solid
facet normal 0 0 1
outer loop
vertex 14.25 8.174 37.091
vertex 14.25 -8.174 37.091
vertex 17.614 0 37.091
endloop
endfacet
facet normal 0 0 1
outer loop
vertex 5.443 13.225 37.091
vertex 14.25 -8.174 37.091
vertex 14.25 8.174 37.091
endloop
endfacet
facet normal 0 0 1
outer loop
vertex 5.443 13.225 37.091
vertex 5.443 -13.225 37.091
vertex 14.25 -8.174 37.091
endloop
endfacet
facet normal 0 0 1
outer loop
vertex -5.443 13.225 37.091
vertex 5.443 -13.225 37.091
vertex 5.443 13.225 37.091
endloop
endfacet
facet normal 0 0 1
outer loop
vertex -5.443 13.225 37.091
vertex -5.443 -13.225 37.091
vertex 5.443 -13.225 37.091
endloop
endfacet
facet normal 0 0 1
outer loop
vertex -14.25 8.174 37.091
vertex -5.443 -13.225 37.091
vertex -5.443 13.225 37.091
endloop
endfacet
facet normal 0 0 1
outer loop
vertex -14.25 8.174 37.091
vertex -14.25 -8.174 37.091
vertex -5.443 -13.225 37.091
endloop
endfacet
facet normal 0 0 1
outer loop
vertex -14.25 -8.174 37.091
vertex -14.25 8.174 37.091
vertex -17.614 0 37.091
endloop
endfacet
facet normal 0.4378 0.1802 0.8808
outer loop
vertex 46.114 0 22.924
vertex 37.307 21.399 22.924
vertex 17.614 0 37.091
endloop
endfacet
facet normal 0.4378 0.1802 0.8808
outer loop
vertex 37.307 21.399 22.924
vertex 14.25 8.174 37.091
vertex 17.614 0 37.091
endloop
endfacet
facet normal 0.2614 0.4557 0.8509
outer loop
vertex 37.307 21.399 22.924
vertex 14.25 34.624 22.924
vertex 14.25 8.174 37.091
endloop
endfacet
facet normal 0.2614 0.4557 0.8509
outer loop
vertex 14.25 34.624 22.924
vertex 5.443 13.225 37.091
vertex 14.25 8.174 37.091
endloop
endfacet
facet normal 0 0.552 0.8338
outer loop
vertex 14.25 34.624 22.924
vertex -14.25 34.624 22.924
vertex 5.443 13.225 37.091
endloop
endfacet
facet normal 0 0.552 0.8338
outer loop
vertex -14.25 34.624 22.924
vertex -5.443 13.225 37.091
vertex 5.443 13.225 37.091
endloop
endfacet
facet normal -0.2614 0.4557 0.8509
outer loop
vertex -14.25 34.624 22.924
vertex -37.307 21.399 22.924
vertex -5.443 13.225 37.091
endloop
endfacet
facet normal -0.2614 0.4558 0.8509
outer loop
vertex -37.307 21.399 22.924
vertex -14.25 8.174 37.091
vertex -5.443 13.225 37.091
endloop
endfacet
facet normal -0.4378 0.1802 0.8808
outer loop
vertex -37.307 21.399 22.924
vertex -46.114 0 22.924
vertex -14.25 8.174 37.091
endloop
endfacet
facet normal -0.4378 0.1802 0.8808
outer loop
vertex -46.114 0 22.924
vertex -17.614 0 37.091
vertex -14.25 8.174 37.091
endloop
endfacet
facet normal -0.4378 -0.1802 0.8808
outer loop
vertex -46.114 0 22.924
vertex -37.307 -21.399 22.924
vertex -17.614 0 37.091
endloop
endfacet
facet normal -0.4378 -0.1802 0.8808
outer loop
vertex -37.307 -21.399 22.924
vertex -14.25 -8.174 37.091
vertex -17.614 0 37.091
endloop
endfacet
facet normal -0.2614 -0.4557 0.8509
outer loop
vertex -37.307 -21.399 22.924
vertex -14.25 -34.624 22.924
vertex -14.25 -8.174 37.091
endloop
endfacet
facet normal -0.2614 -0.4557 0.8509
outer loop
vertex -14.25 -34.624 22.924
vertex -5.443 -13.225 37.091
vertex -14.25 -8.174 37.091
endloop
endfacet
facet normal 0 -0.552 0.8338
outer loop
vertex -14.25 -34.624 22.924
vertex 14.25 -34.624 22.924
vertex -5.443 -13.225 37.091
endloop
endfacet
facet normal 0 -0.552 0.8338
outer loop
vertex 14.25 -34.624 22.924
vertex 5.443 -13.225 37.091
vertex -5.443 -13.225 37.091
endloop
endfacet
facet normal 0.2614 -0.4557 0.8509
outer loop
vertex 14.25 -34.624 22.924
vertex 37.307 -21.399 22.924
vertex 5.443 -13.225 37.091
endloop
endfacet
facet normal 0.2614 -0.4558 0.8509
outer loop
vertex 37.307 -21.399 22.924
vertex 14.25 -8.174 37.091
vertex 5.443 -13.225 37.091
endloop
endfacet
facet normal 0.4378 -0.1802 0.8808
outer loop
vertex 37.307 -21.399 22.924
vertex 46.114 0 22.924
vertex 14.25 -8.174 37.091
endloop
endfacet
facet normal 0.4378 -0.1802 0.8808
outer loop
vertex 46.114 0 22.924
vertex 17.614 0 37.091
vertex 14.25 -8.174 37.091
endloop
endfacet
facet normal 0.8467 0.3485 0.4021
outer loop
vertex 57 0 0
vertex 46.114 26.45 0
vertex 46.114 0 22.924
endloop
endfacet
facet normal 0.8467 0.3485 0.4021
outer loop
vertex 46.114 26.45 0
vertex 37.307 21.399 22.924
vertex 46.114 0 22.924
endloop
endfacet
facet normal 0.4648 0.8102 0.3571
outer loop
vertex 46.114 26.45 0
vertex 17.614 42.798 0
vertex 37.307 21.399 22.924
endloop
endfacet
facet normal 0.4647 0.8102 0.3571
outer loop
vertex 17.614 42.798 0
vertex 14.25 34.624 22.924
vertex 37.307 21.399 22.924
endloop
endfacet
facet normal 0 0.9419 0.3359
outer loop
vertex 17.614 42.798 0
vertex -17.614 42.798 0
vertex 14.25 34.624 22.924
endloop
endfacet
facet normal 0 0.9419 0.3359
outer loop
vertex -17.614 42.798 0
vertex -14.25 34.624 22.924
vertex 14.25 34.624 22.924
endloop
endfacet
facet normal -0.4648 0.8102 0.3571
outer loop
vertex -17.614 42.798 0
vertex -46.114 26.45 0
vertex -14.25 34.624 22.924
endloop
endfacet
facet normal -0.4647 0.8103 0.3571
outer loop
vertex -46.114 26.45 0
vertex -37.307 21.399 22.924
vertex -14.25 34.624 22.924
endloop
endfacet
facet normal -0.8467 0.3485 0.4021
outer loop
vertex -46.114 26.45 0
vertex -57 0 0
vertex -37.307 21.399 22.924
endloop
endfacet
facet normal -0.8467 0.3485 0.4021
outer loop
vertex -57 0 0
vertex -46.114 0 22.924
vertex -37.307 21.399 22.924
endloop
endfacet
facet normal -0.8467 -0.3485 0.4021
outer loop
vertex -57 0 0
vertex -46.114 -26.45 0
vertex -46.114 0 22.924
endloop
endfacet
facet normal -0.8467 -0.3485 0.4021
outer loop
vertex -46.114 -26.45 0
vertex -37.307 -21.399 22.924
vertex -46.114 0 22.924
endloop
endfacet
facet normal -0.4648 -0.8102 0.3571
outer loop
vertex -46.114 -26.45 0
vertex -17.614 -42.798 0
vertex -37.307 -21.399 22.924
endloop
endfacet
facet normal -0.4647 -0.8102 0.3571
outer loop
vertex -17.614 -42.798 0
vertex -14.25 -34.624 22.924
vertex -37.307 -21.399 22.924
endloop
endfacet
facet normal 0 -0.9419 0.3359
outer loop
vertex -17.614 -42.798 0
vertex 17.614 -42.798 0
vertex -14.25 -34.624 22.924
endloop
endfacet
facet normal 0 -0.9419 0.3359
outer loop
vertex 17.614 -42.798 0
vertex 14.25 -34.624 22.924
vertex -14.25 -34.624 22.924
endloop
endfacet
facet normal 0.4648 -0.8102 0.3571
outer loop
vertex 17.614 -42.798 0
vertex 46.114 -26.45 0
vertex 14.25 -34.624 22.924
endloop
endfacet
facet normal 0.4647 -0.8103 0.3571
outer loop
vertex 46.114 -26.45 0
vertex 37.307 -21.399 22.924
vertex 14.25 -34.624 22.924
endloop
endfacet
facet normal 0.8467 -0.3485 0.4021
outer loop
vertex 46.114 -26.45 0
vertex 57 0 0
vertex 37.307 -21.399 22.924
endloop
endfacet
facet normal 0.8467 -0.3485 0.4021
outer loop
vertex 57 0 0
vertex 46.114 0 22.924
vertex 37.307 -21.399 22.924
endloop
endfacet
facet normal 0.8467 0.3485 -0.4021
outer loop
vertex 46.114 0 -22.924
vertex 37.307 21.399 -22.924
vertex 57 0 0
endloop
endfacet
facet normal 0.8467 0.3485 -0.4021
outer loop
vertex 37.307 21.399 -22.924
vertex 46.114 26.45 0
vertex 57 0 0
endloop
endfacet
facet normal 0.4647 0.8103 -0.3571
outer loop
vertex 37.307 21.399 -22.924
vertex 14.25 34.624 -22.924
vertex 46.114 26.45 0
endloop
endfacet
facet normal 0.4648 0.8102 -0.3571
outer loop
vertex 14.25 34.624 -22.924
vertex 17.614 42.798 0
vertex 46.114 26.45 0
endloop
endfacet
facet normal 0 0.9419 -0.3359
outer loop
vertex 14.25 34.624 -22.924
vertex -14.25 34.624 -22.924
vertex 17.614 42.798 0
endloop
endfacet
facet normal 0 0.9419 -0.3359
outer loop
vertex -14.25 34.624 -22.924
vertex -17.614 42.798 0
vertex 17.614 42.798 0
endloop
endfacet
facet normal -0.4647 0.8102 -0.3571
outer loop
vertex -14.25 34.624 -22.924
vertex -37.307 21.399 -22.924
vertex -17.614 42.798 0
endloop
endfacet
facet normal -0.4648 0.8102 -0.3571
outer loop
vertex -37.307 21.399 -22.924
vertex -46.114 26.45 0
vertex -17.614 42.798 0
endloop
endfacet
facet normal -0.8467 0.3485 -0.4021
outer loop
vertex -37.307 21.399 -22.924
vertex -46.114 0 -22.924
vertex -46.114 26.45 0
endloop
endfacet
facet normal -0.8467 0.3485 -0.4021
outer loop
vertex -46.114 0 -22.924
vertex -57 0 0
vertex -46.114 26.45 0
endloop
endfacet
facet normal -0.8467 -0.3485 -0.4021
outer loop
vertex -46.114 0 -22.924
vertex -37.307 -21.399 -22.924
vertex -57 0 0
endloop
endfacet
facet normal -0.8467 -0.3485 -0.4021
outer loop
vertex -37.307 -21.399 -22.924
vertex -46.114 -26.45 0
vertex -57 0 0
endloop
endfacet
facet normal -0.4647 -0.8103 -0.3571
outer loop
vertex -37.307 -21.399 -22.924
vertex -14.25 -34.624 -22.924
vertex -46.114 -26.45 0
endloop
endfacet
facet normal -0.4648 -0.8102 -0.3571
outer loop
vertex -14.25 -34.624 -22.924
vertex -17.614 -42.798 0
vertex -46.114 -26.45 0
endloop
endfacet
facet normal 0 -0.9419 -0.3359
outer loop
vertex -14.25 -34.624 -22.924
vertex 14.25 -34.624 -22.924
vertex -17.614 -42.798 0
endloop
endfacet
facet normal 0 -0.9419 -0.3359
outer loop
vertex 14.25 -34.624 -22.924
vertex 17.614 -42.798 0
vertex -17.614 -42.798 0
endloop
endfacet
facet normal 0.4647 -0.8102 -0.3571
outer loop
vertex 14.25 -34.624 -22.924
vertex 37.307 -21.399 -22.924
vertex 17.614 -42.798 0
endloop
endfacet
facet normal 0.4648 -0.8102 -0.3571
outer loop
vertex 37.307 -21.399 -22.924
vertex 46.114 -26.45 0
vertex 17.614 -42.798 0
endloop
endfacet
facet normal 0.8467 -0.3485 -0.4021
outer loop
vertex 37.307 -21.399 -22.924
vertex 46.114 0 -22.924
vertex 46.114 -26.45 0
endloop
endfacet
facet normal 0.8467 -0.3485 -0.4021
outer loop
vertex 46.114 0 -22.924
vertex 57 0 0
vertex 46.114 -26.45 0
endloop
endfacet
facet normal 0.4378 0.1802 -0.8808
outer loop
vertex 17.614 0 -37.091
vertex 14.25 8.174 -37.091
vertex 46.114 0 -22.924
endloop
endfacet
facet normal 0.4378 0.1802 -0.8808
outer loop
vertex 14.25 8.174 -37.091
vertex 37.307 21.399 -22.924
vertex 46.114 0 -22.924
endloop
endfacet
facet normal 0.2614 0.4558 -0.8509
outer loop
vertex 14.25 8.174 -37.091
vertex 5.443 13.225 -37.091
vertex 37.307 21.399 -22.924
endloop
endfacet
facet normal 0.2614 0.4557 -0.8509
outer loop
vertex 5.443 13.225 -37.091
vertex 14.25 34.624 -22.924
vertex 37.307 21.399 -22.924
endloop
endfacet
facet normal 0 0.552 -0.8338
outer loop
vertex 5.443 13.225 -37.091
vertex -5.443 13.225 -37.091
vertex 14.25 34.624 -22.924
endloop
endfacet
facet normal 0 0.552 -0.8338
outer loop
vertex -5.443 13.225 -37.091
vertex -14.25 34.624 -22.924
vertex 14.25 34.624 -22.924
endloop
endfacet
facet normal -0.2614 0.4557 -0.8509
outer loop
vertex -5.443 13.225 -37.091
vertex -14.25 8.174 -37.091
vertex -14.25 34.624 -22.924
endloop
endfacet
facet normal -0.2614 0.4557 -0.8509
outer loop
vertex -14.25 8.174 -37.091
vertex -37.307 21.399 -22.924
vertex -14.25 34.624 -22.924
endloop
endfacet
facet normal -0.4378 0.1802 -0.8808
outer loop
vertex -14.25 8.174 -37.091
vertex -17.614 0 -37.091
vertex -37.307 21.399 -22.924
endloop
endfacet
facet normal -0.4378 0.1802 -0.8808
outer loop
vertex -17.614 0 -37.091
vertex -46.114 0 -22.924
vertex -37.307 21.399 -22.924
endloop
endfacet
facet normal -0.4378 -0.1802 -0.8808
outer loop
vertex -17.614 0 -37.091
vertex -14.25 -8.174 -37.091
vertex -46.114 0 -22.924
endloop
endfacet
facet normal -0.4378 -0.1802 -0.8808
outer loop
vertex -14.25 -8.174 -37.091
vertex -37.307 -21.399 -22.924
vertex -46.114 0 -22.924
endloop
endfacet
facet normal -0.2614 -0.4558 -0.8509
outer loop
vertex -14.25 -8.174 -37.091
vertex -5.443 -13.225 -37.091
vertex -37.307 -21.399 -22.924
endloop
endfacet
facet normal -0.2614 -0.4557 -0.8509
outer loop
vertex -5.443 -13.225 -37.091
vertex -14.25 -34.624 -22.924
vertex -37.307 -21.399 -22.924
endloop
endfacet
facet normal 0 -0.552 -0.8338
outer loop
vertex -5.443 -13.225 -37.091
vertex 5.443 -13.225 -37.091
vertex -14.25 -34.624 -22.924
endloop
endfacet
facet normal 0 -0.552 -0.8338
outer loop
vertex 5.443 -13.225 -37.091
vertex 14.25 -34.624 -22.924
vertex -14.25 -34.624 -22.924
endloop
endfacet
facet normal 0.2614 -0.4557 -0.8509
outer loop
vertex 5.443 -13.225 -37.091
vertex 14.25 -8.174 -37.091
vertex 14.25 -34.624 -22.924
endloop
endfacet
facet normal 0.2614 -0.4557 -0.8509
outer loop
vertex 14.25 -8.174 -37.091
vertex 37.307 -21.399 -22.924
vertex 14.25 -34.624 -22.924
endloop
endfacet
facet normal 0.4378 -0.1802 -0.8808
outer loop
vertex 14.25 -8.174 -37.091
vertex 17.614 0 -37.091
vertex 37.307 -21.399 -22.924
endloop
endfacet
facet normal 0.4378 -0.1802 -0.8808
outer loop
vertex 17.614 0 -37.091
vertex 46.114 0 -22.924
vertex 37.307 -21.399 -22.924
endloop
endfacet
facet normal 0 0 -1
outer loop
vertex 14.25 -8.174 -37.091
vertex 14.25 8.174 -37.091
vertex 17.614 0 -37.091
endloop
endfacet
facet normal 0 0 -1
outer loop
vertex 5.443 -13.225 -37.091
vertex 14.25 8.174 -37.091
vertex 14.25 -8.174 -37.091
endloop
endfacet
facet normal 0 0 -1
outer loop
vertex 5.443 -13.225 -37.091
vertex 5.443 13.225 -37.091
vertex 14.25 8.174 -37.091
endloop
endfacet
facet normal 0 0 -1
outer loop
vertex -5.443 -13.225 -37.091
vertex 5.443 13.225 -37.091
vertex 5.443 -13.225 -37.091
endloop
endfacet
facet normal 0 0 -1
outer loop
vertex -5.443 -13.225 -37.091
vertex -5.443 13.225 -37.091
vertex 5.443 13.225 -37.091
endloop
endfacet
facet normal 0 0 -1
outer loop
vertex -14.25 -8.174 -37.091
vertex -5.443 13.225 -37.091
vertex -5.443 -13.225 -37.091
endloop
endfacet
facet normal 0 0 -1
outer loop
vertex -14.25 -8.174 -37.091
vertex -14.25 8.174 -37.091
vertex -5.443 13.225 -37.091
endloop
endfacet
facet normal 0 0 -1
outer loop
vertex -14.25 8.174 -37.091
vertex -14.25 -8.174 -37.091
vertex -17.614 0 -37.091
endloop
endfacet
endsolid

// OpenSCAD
// Generated by SolidPython 1.0.1 on 2020-07-29 00:46:54


scale(v = [19, 15, 13]) {
	sphere(r = 3);
}
/***********************************************
*********      SolidPython code:      **********
************************************************
 
# import packages: SolidPython
from solid import *
from solid.utils import *
from itertools import chain, combinations, permutations


class Resize:

    def __init__(self, scad_file):
        self.scad_file = scad_file
        #self.scad_file = import_scad(scad_file)
        # cone/cylinder param:
        self.r1 = 0
        self.r2 = 0
        self.h = 0
        # rectangular prism param:
        self.w = 0
        self.l = 0
        # ellipse param:
        self.r = 0

    # import OpenScad code (file name corresponds to shape)


    # classify shape + parameters
    def assign(self, param1, param2, param3):
        if self.scad_file == 'cone.scad':
            self.r1 = param1
            self.r2 = param2
            self.h = param3
        elif self.scad_file == 'cylinder.scad':
            self.r1 = param1
            self.r2 = param2
            self.h = param3
        elif self.scad_file == 'rectangularPrism.scad':
            self.h = param1
            self.l = param2
            self.w = param3
        else:
            self.r = param1
            self.h = param2

    # resize parameters
    def iterate(self):
        x = range(3, 20, 2)
        i = 1
        if self.scad_file == 'cone.scad':
            tempList = list(permutations(x, 2))
            for temp in tempList:
                param1 = temp[0]
                param2 = temp[1]
                filepath = 'produced_scad_files/' + 'cone' + str(param1) + '_' + str(param2) + '_' + '.scad'
                scad_render_to_file(cylinder(h=param1, r1=param2, r2=0), filepath)

        elif self.scad_file == 'cylinder.scad':
            tempList = list(permutations(x, 3))
            for temp in tempList:
                param1 = temp[0]
                param2 = temp[1]
                filepath = 'produced_scad_files/' + 'cylinder' + str(param1) + '_' + str(param2) + '_' + '.scad'
                scad_render_to_file(cylinder(h=param1, r1=param2, r2=param2), filepath)

        elif self.scad_file == 'rectangularPrism.scad':
            tempList = list(permutations(x, 3))
            for temp in tempList:
                param1 = temp[0]
                param2 = temp[1]
                param3 = temp[2]
                filepath = 'produced_scad_files/' + 'rectangularPrism' + str(param1) + '_' + str(param2) + '_' + str(
                    param3) + '.scad'
                scad_render_to_file(cube(size=(param1, param2, param3)), filepath)

        elif self.scad_file == 'ellipse.scad':
            tempList = list(permutations(x, 4))
            for temp in tempList:
                param1 = temp[0]
                param2 = temp[1]
                param3 = temp[2]
                param4 = temp[3]
                filepath = 'produced_scad_files/' + 'ellipse' + str(param1) + '_' + str(param2) + '_' + str(param3) + '_' + str(param4) + '.scad'
                scad_render_to_file(scale([param1, param2, param3])(sphere(r=param4)), filepath)

    def render_to_scadfile(self):
        scad_render_to_file(scad, 'example.scad') 
 
************************************************/
